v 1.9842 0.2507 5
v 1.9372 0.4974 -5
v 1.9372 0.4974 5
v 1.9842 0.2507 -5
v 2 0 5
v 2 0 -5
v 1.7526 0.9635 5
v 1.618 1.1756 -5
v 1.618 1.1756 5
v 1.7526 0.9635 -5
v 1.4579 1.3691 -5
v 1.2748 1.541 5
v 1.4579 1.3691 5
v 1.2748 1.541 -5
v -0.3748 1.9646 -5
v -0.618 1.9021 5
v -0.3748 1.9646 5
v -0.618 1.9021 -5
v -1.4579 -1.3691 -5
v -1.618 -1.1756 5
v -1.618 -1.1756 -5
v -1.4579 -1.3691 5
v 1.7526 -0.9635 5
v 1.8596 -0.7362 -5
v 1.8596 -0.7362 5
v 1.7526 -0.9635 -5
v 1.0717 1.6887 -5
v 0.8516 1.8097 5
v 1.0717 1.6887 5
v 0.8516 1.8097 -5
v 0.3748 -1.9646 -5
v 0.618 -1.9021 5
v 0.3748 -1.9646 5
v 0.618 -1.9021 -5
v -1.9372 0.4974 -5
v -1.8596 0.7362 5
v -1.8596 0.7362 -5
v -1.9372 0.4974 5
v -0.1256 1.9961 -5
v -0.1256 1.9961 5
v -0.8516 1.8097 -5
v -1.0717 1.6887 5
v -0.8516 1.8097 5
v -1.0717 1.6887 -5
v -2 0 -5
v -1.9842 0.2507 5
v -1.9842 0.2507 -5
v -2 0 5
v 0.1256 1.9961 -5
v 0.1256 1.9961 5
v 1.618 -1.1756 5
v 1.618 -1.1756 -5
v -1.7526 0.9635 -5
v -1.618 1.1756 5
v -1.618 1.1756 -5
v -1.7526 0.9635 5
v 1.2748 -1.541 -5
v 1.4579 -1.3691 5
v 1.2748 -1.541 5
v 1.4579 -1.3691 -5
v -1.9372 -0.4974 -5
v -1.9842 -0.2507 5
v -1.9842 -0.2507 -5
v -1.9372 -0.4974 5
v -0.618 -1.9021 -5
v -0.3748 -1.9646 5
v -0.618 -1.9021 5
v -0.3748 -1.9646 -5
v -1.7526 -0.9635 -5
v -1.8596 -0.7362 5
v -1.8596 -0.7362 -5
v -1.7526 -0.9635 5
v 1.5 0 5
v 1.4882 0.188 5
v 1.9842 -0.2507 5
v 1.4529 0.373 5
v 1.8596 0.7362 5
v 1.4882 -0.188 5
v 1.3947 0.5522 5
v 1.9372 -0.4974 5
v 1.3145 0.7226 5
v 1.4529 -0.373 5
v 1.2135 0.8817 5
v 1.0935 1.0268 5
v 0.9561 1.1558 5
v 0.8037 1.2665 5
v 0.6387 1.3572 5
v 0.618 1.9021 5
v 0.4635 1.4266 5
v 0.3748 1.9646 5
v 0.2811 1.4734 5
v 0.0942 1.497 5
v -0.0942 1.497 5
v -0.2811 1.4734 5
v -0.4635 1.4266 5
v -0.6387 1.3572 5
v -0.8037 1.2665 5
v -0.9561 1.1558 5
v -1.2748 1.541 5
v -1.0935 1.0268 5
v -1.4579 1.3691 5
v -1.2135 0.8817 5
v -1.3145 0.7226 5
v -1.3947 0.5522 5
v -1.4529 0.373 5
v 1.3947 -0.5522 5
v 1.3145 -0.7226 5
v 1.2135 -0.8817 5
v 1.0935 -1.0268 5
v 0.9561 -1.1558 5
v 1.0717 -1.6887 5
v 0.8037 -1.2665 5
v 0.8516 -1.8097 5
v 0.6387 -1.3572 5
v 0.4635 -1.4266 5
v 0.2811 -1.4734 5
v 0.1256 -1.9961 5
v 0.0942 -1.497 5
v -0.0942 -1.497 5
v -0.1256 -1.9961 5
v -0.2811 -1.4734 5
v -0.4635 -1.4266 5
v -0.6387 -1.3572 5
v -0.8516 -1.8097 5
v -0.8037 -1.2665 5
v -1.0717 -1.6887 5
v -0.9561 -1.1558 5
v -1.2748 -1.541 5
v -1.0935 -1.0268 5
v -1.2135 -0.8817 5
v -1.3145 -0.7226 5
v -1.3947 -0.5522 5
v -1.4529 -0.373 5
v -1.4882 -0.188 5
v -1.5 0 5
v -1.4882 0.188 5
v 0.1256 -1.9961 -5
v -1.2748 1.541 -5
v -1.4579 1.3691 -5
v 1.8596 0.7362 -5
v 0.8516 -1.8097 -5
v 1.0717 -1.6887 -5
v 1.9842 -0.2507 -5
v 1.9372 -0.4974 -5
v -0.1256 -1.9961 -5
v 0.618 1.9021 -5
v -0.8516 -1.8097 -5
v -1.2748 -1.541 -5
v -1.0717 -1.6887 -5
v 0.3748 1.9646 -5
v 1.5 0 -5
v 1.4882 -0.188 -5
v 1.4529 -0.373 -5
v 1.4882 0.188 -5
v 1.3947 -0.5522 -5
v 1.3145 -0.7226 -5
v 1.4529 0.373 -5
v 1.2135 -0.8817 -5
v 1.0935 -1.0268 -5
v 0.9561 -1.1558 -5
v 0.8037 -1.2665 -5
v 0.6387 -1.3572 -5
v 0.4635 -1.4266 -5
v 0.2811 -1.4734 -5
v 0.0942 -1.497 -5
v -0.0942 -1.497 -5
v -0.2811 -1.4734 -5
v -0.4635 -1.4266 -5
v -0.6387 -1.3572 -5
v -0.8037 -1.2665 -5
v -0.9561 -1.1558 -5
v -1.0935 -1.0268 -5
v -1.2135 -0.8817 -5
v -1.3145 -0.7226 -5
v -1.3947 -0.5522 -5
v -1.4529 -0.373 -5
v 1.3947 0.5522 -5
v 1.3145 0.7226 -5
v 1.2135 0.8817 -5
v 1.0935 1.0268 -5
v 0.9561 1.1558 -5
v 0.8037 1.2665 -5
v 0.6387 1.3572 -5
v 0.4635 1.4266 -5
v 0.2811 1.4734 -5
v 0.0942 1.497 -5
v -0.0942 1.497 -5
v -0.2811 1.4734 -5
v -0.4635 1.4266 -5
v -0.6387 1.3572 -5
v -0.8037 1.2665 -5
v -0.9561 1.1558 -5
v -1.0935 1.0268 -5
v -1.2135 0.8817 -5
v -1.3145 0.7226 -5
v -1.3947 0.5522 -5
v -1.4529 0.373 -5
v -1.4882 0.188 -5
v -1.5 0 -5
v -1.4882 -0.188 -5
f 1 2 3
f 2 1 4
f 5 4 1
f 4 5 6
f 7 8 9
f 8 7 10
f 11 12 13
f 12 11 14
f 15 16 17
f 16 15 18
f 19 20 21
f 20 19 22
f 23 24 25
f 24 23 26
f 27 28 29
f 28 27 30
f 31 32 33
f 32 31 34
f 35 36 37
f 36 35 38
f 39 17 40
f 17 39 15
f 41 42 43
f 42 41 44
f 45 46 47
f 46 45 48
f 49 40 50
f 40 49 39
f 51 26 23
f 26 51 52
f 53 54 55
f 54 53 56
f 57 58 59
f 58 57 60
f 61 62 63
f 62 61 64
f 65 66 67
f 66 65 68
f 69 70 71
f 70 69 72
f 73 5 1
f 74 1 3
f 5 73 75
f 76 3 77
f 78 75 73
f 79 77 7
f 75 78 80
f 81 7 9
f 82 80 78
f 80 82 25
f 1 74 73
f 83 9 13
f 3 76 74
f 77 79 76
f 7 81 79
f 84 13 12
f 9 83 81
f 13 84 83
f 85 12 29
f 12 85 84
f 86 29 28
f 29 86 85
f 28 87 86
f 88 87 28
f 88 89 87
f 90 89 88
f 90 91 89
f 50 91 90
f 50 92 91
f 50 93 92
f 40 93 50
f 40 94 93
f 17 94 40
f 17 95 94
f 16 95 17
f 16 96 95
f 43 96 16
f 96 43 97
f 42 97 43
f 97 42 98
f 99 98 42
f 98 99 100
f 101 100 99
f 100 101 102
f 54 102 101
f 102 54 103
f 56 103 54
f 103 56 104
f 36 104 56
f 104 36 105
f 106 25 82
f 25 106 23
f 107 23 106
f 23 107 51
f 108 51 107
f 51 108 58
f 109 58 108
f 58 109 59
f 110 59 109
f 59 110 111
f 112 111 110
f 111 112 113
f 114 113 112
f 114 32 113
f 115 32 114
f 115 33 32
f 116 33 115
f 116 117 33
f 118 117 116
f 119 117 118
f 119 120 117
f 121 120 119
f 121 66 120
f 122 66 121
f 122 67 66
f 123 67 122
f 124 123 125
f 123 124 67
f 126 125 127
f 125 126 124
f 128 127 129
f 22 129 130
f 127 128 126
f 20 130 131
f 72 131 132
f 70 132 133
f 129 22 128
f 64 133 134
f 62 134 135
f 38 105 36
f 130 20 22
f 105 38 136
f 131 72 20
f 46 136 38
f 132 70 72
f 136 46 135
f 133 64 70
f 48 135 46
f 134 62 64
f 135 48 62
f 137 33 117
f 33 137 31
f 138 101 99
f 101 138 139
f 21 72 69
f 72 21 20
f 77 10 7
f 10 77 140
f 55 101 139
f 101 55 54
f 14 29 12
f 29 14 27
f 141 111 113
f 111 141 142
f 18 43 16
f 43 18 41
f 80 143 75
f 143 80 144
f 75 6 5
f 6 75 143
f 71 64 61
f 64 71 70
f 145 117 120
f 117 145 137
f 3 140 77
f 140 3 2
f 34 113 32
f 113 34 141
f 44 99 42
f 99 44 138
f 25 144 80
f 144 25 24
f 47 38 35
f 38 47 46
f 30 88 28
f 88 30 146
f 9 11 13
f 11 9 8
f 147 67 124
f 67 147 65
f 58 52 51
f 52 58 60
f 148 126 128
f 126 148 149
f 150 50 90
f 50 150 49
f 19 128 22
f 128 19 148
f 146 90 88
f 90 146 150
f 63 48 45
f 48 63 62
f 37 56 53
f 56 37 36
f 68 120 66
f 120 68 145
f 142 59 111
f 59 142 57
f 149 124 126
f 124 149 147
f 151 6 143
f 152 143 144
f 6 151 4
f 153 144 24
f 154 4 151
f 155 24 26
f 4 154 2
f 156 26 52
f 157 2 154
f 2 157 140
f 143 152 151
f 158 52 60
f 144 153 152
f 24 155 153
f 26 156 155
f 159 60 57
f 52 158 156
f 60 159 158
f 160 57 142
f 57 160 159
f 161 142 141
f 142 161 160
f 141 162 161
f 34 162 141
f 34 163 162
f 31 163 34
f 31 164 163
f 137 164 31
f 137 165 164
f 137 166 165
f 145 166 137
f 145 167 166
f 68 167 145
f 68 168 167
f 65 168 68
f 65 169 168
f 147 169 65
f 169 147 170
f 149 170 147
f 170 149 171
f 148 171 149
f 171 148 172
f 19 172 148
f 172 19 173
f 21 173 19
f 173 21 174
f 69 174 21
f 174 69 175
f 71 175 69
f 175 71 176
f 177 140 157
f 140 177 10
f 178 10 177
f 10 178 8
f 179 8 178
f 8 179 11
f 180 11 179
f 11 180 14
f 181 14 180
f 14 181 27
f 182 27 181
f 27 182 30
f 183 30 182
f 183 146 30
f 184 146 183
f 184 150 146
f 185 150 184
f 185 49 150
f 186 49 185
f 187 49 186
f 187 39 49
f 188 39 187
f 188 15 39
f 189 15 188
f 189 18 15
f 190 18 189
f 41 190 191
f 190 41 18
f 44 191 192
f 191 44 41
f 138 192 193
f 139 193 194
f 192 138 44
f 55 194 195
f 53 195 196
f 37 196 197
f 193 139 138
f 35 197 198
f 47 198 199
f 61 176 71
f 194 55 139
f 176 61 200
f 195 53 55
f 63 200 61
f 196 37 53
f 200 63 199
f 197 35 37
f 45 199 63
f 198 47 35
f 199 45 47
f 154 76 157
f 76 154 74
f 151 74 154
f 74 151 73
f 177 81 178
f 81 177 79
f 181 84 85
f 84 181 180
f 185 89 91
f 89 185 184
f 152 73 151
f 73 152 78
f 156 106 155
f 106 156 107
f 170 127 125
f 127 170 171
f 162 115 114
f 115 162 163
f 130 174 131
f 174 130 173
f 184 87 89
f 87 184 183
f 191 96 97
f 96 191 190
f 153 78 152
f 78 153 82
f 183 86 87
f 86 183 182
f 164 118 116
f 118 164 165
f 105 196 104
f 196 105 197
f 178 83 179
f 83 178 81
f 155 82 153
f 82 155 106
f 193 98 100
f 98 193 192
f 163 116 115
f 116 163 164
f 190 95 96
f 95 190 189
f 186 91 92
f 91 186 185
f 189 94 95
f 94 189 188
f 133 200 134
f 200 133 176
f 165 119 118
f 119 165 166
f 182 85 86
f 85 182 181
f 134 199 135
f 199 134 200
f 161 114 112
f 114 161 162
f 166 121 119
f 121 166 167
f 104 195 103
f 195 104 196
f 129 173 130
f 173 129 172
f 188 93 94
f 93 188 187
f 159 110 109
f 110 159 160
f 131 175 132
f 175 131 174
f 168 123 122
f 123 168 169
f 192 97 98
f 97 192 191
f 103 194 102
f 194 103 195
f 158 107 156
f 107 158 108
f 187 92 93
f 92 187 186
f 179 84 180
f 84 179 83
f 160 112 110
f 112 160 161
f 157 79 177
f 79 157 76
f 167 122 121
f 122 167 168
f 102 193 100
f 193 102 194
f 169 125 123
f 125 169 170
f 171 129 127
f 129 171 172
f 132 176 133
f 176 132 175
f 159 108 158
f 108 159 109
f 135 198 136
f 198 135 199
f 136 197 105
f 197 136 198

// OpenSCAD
$fn = 50;


difference() {
	union() {
		translate(v = [0, 0, -5.0000000000]) {
			cylinder(h = 10, r = 2.0000000000);
		}
	}
	union() {
		translate(v = [0, 0, -100.0000000000]) {
			cylinder(h = 200, r = 1.5000000000);
		}
	}
}
